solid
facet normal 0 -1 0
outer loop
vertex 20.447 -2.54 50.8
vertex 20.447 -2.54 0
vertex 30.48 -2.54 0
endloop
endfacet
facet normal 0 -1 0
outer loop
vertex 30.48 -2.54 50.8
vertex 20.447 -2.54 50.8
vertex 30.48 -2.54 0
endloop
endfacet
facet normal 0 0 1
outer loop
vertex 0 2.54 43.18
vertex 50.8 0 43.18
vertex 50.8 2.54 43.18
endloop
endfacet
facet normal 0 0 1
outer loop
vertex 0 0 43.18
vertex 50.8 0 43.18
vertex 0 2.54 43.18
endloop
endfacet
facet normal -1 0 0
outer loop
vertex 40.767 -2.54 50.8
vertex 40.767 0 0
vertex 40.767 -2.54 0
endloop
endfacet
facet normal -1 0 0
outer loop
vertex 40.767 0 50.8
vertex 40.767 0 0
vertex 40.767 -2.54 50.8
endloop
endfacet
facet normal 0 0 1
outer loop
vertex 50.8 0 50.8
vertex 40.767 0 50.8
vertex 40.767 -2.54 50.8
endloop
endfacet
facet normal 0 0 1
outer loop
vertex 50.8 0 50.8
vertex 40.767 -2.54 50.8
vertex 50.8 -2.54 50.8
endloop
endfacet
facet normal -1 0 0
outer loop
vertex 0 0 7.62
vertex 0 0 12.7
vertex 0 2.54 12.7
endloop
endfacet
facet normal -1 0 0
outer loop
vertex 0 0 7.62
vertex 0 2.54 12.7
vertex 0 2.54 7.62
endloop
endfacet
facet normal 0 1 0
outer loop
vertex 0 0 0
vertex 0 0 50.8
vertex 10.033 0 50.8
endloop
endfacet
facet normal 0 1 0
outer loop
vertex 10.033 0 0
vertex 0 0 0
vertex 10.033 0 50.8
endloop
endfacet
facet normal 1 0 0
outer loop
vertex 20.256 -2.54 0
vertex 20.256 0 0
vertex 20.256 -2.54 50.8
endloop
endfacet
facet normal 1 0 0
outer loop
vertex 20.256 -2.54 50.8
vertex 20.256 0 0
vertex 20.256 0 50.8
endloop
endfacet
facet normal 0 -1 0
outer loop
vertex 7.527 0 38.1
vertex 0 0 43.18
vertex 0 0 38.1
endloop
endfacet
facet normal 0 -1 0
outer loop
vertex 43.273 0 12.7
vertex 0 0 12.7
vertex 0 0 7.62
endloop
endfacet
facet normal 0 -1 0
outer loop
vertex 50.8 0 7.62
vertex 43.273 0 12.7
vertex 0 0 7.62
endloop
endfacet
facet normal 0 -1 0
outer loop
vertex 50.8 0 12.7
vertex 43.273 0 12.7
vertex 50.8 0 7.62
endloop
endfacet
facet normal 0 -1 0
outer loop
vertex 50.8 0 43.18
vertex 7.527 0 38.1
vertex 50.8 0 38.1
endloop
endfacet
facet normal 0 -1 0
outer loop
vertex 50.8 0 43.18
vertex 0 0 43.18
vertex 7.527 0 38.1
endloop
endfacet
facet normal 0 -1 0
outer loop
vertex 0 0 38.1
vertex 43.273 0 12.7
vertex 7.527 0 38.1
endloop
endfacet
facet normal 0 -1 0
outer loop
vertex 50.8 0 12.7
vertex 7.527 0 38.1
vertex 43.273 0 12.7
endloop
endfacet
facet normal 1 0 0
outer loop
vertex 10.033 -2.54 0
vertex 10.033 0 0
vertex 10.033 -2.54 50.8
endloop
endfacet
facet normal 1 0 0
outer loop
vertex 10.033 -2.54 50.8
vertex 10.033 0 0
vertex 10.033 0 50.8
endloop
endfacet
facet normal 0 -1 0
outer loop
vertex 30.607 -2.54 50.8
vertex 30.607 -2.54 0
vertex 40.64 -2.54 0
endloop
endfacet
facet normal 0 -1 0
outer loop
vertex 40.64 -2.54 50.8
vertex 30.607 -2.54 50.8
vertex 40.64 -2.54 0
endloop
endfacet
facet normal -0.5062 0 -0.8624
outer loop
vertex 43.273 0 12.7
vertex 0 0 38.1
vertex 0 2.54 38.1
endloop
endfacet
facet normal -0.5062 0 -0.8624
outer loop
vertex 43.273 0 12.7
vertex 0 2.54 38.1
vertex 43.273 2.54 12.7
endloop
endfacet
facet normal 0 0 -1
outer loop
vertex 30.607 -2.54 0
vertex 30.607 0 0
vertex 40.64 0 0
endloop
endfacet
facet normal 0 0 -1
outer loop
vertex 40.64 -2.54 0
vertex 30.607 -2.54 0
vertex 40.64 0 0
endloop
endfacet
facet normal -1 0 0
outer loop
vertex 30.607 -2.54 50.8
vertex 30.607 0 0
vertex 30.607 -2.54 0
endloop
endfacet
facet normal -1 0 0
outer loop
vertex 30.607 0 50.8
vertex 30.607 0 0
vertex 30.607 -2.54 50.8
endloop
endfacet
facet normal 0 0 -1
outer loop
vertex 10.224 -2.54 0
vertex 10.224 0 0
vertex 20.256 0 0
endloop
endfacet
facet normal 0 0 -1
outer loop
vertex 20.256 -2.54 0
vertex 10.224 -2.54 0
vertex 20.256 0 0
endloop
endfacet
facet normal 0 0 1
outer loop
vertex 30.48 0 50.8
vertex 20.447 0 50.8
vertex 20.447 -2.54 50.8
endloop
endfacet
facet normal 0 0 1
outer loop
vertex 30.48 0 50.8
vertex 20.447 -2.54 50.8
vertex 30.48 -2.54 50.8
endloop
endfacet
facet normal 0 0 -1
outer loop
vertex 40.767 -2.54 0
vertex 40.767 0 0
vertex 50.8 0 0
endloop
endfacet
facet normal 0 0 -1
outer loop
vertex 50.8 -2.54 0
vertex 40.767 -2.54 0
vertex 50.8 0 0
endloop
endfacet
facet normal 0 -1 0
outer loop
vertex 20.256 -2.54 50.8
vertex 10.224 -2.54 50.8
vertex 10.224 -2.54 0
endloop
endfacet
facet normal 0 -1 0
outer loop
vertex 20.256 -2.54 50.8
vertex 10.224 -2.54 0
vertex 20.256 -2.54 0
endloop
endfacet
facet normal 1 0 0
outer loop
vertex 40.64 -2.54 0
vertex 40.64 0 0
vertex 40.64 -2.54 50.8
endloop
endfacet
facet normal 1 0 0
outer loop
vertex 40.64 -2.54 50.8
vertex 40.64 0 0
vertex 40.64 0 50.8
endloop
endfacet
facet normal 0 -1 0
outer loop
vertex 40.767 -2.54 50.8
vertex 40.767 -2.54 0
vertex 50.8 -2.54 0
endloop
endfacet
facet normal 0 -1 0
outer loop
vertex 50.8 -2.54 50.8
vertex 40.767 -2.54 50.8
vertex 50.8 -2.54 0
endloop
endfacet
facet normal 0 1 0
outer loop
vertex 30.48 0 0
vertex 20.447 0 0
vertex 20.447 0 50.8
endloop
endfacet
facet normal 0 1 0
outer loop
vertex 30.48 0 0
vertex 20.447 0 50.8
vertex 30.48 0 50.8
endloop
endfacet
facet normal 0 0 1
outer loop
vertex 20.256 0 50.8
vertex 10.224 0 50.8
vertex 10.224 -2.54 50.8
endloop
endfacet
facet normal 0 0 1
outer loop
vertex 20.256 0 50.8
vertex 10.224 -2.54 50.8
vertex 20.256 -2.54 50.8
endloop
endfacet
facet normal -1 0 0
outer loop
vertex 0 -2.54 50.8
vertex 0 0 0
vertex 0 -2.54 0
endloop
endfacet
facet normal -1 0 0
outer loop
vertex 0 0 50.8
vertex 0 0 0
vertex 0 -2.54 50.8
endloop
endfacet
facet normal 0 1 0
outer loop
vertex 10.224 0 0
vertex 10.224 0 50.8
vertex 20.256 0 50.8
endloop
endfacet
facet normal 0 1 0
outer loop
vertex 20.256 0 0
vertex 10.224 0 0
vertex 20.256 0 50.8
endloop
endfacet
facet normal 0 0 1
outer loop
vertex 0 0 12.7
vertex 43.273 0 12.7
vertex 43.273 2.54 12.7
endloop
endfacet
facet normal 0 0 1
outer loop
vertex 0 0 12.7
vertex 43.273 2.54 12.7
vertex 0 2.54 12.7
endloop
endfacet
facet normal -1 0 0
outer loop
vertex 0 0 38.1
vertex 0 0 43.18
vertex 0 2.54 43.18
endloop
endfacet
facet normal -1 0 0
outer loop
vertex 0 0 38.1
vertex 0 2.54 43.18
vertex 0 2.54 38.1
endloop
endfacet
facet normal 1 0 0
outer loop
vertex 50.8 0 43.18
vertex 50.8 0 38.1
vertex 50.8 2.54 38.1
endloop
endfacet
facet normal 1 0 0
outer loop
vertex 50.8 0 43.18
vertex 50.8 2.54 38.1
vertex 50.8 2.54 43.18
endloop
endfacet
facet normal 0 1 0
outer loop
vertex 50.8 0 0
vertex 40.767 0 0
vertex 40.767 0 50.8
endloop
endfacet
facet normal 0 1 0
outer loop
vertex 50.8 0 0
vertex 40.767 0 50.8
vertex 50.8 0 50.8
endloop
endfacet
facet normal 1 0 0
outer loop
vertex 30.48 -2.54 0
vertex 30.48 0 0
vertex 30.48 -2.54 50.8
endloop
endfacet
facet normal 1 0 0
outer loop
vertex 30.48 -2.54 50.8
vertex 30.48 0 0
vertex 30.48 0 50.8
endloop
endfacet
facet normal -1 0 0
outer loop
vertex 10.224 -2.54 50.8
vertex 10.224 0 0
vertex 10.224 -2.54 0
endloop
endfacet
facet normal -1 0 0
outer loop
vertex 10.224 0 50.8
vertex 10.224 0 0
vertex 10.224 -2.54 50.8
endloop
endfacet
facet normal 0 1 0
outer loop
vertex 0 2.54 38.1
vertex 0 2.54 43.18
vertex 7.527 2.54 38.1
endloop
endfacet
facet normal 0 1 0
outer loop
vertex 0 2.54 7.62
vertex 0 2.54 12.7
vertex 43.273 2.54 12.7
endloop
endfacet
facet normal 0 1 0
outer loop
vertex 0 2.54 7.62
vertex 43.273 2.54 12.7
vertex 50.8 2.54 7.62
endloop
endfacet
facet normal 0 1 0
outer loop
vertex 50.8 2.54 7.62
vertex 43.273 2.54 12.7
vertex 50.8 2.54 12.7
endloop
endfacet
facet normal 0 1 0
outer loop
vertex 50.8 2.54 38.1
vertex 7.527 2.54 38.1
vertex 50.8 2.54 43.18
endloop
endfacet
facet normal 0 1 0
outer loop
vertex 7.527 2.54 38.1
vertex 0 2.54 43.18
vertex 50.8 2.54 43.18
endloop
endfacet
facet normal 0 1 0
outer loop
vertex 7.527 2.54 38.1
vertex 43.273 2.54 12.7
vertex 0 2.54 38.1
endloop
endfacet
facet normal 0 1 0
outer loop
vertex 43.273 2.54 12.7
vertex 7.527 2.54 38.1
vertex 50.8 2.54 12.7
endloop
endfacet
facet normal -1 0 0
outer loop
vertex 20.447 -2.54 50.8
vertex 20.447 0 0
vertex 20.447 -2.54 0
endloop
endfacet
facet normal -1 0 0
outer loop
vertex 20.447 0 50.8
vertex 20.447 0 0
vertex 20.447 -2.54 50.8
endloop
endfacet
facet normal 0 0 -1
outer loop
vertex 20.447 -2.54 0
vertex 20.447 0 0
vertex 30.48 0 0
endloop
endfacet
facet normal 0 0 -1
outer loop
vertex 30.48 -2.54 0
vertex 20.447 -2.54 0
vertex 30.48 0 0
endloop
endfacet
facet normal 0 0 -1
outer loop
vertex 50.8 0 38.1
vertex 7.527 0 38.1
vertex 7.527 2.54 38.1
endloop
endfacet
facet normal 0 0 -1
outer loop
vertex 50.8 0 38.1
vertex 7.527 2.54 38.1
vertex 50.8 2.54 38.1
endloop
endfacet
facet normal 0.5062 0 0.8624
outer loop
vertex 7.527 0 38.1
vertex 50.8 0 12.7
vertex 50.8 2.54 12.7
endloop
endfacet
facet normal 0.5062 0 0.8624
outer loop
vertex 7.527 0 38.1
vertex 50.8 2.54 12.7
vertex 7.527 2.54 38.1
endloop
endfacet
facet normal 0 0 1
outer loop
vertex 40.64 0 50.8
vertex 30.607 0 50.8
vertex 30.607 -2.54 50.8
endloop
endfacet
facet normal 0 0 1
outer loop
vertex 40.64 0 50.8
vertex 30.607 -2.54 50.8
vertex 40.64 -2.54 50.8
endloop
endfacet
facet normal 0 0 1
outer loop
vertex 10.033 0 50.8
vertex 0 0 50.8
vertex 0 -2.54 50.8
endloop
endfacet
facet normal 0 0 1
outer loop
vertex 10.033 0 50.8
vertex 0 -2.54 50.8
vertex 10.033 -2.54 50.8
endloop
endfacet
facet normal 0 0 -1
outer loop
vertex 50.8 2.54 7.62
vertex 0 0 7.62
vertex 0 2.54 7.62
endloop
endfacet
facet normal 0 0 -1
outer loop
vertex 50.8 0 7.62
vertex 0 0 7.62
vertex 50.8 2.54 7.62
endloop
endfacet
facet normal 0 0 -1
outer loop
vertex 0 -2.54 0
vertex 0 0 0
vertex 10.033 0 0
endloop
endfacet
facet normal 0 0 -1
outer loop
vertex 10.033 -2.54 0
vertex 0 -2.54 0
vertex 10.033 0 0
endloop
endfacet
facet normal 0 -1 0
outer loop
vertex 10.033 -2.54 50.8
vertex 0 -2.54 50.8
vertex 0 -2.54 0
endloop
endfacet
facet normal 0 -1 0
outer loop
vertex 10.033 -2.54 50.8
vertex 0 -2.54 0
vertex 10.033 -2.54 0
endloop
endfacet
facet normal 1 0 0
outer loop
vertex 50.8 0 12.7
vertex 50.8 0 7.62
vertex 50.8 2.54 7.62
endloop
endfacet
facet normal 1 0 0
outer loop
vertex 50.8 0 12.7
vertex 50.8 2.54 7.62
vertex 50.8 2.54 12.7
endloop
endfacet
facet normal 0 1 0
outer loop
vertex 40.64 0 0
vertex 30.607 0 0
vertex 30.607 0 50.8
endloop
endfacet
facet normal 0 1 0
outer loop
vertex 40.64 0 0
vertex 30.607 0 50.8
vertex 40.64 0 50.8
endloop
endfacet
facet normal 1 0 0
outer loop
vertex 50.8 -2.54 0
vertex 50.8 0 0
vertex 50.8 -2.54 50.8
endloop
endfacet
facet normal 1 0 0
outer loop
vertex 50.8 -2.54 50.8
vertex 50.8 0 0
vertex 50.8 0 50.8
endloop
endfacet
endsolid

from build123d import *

# Parameters (mm, degrees)
F0_W     = 10.033
F0_H     = 50.8
F1_DEPTH = 2.54
F3_DEPTH = 2.54


with BuildPart() as f1:
    # F0 (on Front) → F1 (new body)
    with BuildSketch(Plane.XZ):
        with Locations((5.0165, 25.4)):
            Rectangle(F0_W, F0_H)
        with Locations((25.4635, 25.4)):
            Rectangle(F0_W, F0_H)
        with Locations((15.24, 25.4)):
            Rectangle(F0_W, F0_H)
        with Locations((35.6235, 25.4)):
            Rectangle(F0_W, F0_H)
        with Locations((45.7835, 25.4)):
            Rectangle(F0_W, F0_H)
    extrude(amount=F1_DEPTH)


with BuildPart() as f3:
    # F2 (on Front) → F3 (new body)
    with BuildSketch(Plane.XZ):
        Polygon((0, 38.1), (7.526577, 38.1), (50.8, 38.1), (50.8, 43.18), (0, 43.18), align=None)
        Polygon((0, 12.7), (0, 7.62), (50.8, 7.62), (50.8, 12.7), (43.273423, 12.7), align=None)
        Polygon((43.273423, 12.7), (50.8, 12.7), (7.526577, 38.1), (0, 38.1), align=None)
    extrude(amount=-F3_DEPTH)


solid = Compound([f1.part, f3.part])
